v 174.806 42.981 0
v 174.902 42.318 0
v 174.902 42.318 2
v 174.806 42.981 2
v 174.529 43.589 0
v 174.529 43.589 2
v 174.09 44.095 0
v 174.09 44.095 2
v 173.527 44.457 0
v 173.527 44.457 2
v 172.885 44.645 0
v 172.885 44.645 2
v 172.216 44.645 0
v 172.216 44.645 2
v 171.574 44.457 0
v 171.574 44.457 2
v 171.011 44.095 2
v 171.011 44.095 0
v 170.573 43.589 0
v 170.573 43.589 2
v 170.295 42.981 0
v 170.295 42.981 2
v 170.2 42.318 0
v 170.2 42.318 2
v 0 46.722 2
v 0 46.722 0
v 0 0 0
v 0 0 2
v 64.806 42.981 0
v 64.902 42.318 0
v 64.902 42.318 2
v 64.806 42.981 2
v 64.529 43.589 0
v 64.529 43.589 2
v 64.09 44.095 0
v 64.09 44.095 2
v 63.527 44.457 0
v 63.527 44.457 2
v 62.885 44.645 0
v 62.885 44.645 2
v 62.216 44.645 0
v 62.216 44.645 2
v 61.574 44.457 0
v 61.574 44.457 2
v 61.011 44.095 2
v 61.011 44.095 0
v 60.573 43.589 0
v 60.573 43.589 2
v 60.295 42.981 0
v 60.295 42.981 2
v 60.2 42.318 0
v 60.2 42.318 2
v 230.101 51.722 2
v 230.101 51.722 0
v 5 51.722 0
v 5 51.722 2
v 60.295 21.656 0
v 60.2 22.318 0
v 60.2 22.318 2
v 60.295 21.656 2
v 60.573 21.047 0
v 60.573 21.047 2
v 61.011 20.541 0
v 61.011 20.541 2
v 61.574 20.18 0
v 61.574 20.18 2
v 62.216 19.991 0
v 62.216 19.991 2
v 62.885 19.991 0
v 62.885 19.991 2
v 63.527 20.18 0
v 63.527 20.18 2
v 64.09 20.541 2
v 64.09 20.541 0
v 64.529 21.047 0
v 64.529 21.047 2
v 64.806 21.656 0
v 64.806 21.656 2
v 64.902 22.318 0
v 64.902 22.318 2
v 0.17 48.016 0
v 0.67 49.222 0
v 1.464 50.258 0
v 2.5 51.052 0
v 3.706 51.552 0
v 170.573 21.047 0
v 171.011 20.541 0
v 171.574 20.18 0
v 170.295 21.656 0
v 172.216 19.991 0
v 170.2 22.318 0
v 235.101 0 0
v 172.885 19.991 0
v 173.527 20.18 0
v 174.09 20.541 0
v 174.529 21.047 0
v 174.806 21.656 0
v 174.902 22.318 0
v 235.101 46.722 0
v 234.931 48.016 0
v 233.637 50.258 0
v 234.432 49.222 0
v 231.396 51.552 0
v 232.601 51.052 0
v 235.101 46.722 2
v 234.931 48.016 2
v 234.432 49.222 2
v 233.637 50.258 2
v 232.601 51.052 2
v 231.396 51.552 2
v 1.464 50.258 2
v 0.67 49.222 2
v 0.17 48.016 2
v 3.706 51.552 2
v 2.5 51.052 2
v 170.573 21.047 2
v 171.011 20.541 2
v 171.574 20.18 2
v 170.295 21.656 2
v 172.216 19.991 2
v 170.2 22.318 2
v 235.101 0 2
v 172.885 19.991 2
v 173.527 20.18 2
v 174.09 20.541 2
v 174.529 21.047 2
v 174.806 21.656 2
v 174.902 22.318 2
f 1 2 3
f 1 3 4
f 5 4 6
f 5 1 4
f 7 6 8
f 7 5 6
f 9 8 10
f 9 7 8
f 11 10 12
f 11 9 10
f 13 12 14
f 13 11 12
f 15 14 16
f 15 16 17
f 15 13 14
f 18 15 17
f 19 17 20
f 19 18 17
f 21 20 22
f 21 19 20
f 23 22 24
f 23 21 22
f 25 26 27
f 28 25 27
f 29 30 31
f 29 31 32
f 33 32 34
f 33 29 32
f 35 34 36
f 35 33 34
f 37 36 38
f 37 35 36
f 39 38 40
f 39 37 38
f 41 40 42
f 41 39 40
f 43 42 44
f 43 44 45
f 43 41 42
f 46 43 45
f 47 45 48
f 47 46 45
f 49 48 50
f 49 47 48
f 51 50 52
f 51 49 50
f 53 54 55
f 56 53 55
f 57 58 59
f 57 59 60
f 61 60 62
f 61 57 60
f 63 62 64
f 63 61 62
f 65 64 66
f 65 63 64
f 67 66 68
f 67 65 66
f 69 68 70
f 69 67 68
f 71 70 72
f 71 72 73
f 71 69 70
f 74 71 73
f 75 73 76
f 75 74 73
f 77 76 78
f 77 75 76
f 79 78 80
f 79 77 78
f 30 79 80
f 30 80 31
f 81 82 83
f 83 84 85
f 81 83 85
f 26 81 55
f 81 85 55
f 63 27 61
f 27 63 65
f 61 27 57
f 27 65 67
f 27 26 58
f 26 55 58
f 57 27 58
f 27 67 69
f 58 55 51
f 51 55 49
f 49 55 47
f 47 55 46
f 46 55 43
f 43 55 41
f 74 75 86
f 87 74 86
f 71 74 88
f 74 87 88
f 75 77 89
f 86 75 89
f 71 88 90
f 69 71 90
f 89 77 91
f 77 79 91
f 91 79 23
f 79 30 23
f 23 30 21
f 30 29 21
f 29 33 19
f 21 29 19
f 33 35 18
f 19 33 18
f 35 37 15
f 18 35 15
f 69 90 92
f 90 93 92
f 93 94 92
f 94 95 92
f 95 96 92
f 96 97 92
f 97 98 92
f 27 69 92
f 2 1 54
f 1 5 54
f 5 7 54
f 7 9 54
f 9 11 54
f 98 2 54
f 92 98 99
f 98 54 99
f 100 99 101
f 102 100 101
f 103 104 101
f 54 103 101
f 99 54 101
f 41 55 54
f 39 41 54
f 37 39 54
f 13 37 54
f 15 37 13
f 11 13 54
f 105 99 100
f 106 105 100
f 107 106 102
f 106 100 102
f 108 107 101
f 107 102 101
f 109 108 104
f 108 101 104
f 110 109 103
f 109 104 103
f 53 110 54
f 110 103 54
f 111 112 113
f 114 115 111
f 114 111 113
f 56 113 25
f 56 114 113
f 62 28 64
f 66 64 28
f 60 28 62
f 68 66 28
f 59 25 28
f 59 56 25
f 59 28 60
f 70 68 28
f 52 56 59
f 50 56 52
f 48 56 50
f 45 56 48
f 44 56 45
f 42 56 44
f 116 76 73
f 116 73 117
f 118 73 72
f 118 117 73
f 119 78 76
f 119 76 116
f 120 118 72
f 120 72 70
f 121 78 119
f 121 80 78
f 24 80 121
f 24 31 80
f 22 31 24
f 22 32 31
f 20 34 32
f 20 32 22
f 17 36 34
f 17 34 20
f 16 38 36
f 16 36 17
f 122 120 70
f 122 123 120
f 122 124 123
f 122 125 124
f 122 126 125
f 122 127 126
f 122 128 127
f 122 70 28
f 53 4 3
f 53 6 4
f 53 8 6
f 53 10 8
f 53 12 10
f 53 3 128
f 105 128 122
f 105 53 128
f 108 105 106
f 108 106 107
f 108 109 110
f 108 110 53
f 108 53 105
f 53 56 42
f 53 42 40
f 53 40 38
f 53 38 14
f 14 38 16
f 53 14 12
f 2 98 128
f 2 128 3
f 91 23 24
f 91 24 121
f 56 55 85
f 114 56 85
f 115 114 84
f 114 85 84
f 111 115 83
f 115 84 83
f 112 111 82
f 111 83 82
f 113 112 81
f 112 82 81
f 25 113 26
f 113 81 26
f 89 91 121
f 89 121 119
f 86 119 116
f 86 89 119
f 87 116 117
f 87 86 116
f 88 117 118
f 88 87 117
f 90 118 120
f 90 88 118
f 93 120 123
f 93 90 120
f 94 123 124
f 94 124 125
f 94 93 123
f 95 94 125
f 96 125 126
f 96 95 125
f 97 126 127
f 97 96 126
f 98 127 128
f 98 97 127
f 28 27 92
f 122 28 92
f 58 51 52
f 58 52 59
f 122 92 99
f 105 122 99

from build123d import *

# Parameters (mm, degrees)
EXTRUDE_1_DEPTH = 2


with BuildPart() as part:
    # 草图1 → 凸台-拉伸1 (new body)
    with BuildSketch(Plane.XY):
        with BuildLine():
            Line((0, 0), (235.10143352, 0))
            Line((235.10143352, 0), (235.10143352, 46.722315374))
            ThreePointArc((235.10143352, 46.722315374), (233.636967425, 50.25784928), (230.10143352, 51.722315374))
            Line((230.10143352, 51.722315374), (5, 51.722315374))
            ThreePointArc((5, 51.722315374), (1.464466094, 50.25784928), (0, 46.722315374))
            Line((0, 46.722315374), (0, 0))
        make_face()
        with BuildLine():
            Line((60.199702425, 42.318258034), (60.199702425, 22.318258034))
            ThreePointArc((60.199702425, 22.318258034), (62.55071676, 19.967243698), (64.901731095, 22.318258034))
            Line((64.901731095, 22.318258034), (64.901731095, 42.318258034))
            ThreePointArc((64.901731095, 42.318258034), (62.55071676, 44.669272369), (60.199702425, 42.318258034))
        make_face(mode=Mode.SUBTRACT)
        with BuildLine():
            Line((170.199702425, 42.318258034), (170.199702425, 22.318258034))
            ThreePointArc((170.199702425, 22.318258034), (172.55071676, 19.967243698), (174.901731095, 22.318258034))
            Line((174.901731095, 22.318258034), (174.901731095, 42.318258034))
            ThreePointArc((174.901731095, 42.318258034), (172.55071676, 44.669272369), (170.199702425, 42.318258034))
        make_face(mode=Mode.SUBTRACT)
    extrude(amount=EXTRUDE_1_DEPTH)


solid = part.part
